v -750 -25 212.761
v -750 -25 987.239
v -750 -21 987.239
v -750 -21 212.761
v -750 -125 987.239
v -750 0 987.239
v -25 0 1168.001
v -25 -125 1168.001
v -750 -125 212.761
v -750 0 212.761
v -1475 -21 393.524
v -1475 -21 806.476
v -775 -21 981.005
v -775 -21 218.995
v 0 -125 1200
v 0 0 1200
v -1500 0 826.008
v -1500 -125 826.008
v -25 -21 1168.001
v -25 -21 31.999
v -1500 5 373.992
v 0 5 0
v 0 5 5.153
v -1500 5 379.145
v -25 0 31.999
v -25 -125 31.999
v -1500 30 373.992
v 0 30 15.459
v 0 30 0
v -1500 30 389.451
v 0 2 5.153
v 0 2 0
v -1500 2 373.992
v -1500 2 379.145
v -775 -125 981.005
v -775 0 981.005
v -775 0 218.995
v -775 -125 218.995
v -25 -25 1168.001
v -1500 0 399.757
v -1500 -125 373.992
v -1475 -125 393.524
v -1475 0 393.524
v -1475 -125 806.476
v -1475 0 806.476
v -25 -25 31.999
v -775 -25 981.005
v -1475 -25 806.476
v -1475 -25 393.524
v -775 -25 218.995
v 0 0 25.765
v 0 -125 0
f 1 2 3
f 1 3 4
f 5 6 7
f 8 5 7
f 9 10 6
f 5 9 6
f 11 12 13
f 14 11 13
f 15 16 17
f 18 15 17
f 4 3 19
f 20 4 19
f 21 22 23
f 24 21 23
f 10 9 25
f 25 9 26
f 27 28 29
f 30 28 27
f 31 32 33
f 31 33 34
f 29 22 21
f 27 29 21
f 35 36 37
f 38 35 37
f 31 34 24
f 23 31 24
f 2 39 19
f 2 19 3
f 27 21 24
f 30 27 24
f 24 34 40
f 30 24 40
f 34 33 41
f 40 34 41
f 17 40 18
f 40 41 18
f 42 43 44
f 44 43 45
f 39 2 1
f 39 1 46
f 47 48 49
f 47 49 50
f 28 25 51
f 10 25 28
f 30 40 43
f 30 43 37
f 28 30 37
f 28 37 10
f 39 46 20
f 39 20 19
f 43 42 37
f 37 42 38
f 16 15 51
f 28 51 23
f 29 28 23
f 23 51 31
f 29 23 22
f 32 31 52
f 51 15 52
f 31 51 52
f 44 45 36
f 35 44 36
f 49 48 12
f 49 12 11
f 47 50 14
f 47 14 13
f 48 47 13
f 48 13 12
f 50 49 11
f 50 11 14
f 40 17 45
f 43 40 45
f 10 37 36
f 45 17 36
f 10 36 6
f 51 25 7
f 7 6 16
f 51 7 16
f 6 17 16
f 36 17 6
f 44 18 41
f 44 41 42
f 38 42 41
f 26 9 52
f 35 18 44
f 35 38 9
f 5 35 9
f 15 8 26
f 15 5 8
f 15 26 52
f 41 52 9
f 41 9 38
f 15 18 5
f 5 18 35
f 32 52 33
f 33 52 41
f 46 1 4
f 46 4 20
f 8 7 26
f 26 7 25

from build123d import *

# Parameters (mm, degrees)
F1_DEPTH  = 125
F3_DEPTH  = 50
F5_DEPTH  = 125.001
F9_DEPTH  = 30
F12_DEPTH = 1552.1546440959
F13_W     = 3
F13_H     = 5
F14_DEPTH = 1552.1546440959
F15_DEPTH = 4


with BuildPart() as f1:
    # F0 (on Front) → F1 (new body)
    with BuildSketch(Plane.XZ):
        Polygon((-1500, 373.9920042648), (0, 0), (0, 1200), (-1500, 826.0079957352), align=None)
    extrude(amount=F1_DEPTH)

    # F2 (on face) → F3 (cut)
    with BuildSketch(Plane.XZ.offset(125)):
        Polygon((-25, 31.9985408048), (-25, 1168.0014591952), (-750, 987.2386571339), (-750, 212.7613428661), align=None)
        Polygon((-1475, 806.4758550726), (-1475, 393.5241449274), (-775, 218.9945429372), (-775, 981.0054570628), align=None)
    extrude(amount=-F3_DEPTH, mode=Mode.SUBTRACT)

    # F4 (on face) → F5 (cut, through all)
    with BuildSketch(Plane(origin=(0, 0, 0), x_dir=(-1, 0, 0), z_dir=(0, 1, 0))):
        Polygon((750, 987.2386571339), (25, 1168.0014591952), (25, 31.9985408048), (750, 212.7613428661), align=None)
        Polygon((775, 218.9945429372), (1475, 393.5241449274), (1475, 806.4758550726), (775, 981.0054570628), align=None)
    extrude(amount=-F5_DEPTH, mode=Mode.SUBTRACT)

    # F8 (on face) → F9 (join)
    with BuildSketch(Plane(origin=(0, 0, 0), x_dir=(-1, 0, 0), z_dir=(0, 1, 0))):
        Polygon((1500, 399.7573449985), (750, 212.7613428661), (25, 31.9985408048), (0, 25.7653407337), (0, 0), (1500, 373.9920042648), align=None)
    extrude(amount=F9_DEPTH)

    # F11 (on face) → F12 (cut, through all)
    with BuildSketch(Plane(origin=(-1506.04804739, 0, 375.4999518416), x_dir=(0, 1, 0), z_dir=(0.9702957263, 0, -0.2419218956))):
        Polygon((30, 15), (30, 25), (0, 25), align=None)
    extrude(amount=F12_DEPTH, mode=Mode.SUBTRACT)

    # F13 (on face) → F14 (cut, through all)
    with BuildSketch(Plane(origin=(-1506.04804739, 0, 375.4999518416), x_dir=(0, 1, 0), z_dir=(0.9702957263, 0, -0.2419218956))):
        with Locations((3.5, 2.5)):
            Rectangle(F13_W, F13_H)
    extrude(amount=F14_DEPTH, mode=Mode.SUBTRACT)


with BuildPart() as f15:
    # F7 (on offset) → F15 (new body)
    with BuildSketch(Plane.XZ.offset(25)):
        Polygon((-25, 31.9985408048), (-25, 1168.0014591952), (-750, 987.2386571339), (-750, 212.7613428661), align=None)
    extrude(amount=-F15_DEPTH)


with BuildPart() as f15b:
    # F7 (on offset) → F15, piece 2 (new body)
    with BuildSketch(Plane.XZ.offset(25)):
        Polygon((-775, 218.9945429372), (-775, 981.0054570628), (-1475, 806.4758550726), (-1475, 393.5241449274), align=None)
    extrude(amount=-F15_DEPTH)


solid = Compound([f1.part, f15.part, f15b.part])
